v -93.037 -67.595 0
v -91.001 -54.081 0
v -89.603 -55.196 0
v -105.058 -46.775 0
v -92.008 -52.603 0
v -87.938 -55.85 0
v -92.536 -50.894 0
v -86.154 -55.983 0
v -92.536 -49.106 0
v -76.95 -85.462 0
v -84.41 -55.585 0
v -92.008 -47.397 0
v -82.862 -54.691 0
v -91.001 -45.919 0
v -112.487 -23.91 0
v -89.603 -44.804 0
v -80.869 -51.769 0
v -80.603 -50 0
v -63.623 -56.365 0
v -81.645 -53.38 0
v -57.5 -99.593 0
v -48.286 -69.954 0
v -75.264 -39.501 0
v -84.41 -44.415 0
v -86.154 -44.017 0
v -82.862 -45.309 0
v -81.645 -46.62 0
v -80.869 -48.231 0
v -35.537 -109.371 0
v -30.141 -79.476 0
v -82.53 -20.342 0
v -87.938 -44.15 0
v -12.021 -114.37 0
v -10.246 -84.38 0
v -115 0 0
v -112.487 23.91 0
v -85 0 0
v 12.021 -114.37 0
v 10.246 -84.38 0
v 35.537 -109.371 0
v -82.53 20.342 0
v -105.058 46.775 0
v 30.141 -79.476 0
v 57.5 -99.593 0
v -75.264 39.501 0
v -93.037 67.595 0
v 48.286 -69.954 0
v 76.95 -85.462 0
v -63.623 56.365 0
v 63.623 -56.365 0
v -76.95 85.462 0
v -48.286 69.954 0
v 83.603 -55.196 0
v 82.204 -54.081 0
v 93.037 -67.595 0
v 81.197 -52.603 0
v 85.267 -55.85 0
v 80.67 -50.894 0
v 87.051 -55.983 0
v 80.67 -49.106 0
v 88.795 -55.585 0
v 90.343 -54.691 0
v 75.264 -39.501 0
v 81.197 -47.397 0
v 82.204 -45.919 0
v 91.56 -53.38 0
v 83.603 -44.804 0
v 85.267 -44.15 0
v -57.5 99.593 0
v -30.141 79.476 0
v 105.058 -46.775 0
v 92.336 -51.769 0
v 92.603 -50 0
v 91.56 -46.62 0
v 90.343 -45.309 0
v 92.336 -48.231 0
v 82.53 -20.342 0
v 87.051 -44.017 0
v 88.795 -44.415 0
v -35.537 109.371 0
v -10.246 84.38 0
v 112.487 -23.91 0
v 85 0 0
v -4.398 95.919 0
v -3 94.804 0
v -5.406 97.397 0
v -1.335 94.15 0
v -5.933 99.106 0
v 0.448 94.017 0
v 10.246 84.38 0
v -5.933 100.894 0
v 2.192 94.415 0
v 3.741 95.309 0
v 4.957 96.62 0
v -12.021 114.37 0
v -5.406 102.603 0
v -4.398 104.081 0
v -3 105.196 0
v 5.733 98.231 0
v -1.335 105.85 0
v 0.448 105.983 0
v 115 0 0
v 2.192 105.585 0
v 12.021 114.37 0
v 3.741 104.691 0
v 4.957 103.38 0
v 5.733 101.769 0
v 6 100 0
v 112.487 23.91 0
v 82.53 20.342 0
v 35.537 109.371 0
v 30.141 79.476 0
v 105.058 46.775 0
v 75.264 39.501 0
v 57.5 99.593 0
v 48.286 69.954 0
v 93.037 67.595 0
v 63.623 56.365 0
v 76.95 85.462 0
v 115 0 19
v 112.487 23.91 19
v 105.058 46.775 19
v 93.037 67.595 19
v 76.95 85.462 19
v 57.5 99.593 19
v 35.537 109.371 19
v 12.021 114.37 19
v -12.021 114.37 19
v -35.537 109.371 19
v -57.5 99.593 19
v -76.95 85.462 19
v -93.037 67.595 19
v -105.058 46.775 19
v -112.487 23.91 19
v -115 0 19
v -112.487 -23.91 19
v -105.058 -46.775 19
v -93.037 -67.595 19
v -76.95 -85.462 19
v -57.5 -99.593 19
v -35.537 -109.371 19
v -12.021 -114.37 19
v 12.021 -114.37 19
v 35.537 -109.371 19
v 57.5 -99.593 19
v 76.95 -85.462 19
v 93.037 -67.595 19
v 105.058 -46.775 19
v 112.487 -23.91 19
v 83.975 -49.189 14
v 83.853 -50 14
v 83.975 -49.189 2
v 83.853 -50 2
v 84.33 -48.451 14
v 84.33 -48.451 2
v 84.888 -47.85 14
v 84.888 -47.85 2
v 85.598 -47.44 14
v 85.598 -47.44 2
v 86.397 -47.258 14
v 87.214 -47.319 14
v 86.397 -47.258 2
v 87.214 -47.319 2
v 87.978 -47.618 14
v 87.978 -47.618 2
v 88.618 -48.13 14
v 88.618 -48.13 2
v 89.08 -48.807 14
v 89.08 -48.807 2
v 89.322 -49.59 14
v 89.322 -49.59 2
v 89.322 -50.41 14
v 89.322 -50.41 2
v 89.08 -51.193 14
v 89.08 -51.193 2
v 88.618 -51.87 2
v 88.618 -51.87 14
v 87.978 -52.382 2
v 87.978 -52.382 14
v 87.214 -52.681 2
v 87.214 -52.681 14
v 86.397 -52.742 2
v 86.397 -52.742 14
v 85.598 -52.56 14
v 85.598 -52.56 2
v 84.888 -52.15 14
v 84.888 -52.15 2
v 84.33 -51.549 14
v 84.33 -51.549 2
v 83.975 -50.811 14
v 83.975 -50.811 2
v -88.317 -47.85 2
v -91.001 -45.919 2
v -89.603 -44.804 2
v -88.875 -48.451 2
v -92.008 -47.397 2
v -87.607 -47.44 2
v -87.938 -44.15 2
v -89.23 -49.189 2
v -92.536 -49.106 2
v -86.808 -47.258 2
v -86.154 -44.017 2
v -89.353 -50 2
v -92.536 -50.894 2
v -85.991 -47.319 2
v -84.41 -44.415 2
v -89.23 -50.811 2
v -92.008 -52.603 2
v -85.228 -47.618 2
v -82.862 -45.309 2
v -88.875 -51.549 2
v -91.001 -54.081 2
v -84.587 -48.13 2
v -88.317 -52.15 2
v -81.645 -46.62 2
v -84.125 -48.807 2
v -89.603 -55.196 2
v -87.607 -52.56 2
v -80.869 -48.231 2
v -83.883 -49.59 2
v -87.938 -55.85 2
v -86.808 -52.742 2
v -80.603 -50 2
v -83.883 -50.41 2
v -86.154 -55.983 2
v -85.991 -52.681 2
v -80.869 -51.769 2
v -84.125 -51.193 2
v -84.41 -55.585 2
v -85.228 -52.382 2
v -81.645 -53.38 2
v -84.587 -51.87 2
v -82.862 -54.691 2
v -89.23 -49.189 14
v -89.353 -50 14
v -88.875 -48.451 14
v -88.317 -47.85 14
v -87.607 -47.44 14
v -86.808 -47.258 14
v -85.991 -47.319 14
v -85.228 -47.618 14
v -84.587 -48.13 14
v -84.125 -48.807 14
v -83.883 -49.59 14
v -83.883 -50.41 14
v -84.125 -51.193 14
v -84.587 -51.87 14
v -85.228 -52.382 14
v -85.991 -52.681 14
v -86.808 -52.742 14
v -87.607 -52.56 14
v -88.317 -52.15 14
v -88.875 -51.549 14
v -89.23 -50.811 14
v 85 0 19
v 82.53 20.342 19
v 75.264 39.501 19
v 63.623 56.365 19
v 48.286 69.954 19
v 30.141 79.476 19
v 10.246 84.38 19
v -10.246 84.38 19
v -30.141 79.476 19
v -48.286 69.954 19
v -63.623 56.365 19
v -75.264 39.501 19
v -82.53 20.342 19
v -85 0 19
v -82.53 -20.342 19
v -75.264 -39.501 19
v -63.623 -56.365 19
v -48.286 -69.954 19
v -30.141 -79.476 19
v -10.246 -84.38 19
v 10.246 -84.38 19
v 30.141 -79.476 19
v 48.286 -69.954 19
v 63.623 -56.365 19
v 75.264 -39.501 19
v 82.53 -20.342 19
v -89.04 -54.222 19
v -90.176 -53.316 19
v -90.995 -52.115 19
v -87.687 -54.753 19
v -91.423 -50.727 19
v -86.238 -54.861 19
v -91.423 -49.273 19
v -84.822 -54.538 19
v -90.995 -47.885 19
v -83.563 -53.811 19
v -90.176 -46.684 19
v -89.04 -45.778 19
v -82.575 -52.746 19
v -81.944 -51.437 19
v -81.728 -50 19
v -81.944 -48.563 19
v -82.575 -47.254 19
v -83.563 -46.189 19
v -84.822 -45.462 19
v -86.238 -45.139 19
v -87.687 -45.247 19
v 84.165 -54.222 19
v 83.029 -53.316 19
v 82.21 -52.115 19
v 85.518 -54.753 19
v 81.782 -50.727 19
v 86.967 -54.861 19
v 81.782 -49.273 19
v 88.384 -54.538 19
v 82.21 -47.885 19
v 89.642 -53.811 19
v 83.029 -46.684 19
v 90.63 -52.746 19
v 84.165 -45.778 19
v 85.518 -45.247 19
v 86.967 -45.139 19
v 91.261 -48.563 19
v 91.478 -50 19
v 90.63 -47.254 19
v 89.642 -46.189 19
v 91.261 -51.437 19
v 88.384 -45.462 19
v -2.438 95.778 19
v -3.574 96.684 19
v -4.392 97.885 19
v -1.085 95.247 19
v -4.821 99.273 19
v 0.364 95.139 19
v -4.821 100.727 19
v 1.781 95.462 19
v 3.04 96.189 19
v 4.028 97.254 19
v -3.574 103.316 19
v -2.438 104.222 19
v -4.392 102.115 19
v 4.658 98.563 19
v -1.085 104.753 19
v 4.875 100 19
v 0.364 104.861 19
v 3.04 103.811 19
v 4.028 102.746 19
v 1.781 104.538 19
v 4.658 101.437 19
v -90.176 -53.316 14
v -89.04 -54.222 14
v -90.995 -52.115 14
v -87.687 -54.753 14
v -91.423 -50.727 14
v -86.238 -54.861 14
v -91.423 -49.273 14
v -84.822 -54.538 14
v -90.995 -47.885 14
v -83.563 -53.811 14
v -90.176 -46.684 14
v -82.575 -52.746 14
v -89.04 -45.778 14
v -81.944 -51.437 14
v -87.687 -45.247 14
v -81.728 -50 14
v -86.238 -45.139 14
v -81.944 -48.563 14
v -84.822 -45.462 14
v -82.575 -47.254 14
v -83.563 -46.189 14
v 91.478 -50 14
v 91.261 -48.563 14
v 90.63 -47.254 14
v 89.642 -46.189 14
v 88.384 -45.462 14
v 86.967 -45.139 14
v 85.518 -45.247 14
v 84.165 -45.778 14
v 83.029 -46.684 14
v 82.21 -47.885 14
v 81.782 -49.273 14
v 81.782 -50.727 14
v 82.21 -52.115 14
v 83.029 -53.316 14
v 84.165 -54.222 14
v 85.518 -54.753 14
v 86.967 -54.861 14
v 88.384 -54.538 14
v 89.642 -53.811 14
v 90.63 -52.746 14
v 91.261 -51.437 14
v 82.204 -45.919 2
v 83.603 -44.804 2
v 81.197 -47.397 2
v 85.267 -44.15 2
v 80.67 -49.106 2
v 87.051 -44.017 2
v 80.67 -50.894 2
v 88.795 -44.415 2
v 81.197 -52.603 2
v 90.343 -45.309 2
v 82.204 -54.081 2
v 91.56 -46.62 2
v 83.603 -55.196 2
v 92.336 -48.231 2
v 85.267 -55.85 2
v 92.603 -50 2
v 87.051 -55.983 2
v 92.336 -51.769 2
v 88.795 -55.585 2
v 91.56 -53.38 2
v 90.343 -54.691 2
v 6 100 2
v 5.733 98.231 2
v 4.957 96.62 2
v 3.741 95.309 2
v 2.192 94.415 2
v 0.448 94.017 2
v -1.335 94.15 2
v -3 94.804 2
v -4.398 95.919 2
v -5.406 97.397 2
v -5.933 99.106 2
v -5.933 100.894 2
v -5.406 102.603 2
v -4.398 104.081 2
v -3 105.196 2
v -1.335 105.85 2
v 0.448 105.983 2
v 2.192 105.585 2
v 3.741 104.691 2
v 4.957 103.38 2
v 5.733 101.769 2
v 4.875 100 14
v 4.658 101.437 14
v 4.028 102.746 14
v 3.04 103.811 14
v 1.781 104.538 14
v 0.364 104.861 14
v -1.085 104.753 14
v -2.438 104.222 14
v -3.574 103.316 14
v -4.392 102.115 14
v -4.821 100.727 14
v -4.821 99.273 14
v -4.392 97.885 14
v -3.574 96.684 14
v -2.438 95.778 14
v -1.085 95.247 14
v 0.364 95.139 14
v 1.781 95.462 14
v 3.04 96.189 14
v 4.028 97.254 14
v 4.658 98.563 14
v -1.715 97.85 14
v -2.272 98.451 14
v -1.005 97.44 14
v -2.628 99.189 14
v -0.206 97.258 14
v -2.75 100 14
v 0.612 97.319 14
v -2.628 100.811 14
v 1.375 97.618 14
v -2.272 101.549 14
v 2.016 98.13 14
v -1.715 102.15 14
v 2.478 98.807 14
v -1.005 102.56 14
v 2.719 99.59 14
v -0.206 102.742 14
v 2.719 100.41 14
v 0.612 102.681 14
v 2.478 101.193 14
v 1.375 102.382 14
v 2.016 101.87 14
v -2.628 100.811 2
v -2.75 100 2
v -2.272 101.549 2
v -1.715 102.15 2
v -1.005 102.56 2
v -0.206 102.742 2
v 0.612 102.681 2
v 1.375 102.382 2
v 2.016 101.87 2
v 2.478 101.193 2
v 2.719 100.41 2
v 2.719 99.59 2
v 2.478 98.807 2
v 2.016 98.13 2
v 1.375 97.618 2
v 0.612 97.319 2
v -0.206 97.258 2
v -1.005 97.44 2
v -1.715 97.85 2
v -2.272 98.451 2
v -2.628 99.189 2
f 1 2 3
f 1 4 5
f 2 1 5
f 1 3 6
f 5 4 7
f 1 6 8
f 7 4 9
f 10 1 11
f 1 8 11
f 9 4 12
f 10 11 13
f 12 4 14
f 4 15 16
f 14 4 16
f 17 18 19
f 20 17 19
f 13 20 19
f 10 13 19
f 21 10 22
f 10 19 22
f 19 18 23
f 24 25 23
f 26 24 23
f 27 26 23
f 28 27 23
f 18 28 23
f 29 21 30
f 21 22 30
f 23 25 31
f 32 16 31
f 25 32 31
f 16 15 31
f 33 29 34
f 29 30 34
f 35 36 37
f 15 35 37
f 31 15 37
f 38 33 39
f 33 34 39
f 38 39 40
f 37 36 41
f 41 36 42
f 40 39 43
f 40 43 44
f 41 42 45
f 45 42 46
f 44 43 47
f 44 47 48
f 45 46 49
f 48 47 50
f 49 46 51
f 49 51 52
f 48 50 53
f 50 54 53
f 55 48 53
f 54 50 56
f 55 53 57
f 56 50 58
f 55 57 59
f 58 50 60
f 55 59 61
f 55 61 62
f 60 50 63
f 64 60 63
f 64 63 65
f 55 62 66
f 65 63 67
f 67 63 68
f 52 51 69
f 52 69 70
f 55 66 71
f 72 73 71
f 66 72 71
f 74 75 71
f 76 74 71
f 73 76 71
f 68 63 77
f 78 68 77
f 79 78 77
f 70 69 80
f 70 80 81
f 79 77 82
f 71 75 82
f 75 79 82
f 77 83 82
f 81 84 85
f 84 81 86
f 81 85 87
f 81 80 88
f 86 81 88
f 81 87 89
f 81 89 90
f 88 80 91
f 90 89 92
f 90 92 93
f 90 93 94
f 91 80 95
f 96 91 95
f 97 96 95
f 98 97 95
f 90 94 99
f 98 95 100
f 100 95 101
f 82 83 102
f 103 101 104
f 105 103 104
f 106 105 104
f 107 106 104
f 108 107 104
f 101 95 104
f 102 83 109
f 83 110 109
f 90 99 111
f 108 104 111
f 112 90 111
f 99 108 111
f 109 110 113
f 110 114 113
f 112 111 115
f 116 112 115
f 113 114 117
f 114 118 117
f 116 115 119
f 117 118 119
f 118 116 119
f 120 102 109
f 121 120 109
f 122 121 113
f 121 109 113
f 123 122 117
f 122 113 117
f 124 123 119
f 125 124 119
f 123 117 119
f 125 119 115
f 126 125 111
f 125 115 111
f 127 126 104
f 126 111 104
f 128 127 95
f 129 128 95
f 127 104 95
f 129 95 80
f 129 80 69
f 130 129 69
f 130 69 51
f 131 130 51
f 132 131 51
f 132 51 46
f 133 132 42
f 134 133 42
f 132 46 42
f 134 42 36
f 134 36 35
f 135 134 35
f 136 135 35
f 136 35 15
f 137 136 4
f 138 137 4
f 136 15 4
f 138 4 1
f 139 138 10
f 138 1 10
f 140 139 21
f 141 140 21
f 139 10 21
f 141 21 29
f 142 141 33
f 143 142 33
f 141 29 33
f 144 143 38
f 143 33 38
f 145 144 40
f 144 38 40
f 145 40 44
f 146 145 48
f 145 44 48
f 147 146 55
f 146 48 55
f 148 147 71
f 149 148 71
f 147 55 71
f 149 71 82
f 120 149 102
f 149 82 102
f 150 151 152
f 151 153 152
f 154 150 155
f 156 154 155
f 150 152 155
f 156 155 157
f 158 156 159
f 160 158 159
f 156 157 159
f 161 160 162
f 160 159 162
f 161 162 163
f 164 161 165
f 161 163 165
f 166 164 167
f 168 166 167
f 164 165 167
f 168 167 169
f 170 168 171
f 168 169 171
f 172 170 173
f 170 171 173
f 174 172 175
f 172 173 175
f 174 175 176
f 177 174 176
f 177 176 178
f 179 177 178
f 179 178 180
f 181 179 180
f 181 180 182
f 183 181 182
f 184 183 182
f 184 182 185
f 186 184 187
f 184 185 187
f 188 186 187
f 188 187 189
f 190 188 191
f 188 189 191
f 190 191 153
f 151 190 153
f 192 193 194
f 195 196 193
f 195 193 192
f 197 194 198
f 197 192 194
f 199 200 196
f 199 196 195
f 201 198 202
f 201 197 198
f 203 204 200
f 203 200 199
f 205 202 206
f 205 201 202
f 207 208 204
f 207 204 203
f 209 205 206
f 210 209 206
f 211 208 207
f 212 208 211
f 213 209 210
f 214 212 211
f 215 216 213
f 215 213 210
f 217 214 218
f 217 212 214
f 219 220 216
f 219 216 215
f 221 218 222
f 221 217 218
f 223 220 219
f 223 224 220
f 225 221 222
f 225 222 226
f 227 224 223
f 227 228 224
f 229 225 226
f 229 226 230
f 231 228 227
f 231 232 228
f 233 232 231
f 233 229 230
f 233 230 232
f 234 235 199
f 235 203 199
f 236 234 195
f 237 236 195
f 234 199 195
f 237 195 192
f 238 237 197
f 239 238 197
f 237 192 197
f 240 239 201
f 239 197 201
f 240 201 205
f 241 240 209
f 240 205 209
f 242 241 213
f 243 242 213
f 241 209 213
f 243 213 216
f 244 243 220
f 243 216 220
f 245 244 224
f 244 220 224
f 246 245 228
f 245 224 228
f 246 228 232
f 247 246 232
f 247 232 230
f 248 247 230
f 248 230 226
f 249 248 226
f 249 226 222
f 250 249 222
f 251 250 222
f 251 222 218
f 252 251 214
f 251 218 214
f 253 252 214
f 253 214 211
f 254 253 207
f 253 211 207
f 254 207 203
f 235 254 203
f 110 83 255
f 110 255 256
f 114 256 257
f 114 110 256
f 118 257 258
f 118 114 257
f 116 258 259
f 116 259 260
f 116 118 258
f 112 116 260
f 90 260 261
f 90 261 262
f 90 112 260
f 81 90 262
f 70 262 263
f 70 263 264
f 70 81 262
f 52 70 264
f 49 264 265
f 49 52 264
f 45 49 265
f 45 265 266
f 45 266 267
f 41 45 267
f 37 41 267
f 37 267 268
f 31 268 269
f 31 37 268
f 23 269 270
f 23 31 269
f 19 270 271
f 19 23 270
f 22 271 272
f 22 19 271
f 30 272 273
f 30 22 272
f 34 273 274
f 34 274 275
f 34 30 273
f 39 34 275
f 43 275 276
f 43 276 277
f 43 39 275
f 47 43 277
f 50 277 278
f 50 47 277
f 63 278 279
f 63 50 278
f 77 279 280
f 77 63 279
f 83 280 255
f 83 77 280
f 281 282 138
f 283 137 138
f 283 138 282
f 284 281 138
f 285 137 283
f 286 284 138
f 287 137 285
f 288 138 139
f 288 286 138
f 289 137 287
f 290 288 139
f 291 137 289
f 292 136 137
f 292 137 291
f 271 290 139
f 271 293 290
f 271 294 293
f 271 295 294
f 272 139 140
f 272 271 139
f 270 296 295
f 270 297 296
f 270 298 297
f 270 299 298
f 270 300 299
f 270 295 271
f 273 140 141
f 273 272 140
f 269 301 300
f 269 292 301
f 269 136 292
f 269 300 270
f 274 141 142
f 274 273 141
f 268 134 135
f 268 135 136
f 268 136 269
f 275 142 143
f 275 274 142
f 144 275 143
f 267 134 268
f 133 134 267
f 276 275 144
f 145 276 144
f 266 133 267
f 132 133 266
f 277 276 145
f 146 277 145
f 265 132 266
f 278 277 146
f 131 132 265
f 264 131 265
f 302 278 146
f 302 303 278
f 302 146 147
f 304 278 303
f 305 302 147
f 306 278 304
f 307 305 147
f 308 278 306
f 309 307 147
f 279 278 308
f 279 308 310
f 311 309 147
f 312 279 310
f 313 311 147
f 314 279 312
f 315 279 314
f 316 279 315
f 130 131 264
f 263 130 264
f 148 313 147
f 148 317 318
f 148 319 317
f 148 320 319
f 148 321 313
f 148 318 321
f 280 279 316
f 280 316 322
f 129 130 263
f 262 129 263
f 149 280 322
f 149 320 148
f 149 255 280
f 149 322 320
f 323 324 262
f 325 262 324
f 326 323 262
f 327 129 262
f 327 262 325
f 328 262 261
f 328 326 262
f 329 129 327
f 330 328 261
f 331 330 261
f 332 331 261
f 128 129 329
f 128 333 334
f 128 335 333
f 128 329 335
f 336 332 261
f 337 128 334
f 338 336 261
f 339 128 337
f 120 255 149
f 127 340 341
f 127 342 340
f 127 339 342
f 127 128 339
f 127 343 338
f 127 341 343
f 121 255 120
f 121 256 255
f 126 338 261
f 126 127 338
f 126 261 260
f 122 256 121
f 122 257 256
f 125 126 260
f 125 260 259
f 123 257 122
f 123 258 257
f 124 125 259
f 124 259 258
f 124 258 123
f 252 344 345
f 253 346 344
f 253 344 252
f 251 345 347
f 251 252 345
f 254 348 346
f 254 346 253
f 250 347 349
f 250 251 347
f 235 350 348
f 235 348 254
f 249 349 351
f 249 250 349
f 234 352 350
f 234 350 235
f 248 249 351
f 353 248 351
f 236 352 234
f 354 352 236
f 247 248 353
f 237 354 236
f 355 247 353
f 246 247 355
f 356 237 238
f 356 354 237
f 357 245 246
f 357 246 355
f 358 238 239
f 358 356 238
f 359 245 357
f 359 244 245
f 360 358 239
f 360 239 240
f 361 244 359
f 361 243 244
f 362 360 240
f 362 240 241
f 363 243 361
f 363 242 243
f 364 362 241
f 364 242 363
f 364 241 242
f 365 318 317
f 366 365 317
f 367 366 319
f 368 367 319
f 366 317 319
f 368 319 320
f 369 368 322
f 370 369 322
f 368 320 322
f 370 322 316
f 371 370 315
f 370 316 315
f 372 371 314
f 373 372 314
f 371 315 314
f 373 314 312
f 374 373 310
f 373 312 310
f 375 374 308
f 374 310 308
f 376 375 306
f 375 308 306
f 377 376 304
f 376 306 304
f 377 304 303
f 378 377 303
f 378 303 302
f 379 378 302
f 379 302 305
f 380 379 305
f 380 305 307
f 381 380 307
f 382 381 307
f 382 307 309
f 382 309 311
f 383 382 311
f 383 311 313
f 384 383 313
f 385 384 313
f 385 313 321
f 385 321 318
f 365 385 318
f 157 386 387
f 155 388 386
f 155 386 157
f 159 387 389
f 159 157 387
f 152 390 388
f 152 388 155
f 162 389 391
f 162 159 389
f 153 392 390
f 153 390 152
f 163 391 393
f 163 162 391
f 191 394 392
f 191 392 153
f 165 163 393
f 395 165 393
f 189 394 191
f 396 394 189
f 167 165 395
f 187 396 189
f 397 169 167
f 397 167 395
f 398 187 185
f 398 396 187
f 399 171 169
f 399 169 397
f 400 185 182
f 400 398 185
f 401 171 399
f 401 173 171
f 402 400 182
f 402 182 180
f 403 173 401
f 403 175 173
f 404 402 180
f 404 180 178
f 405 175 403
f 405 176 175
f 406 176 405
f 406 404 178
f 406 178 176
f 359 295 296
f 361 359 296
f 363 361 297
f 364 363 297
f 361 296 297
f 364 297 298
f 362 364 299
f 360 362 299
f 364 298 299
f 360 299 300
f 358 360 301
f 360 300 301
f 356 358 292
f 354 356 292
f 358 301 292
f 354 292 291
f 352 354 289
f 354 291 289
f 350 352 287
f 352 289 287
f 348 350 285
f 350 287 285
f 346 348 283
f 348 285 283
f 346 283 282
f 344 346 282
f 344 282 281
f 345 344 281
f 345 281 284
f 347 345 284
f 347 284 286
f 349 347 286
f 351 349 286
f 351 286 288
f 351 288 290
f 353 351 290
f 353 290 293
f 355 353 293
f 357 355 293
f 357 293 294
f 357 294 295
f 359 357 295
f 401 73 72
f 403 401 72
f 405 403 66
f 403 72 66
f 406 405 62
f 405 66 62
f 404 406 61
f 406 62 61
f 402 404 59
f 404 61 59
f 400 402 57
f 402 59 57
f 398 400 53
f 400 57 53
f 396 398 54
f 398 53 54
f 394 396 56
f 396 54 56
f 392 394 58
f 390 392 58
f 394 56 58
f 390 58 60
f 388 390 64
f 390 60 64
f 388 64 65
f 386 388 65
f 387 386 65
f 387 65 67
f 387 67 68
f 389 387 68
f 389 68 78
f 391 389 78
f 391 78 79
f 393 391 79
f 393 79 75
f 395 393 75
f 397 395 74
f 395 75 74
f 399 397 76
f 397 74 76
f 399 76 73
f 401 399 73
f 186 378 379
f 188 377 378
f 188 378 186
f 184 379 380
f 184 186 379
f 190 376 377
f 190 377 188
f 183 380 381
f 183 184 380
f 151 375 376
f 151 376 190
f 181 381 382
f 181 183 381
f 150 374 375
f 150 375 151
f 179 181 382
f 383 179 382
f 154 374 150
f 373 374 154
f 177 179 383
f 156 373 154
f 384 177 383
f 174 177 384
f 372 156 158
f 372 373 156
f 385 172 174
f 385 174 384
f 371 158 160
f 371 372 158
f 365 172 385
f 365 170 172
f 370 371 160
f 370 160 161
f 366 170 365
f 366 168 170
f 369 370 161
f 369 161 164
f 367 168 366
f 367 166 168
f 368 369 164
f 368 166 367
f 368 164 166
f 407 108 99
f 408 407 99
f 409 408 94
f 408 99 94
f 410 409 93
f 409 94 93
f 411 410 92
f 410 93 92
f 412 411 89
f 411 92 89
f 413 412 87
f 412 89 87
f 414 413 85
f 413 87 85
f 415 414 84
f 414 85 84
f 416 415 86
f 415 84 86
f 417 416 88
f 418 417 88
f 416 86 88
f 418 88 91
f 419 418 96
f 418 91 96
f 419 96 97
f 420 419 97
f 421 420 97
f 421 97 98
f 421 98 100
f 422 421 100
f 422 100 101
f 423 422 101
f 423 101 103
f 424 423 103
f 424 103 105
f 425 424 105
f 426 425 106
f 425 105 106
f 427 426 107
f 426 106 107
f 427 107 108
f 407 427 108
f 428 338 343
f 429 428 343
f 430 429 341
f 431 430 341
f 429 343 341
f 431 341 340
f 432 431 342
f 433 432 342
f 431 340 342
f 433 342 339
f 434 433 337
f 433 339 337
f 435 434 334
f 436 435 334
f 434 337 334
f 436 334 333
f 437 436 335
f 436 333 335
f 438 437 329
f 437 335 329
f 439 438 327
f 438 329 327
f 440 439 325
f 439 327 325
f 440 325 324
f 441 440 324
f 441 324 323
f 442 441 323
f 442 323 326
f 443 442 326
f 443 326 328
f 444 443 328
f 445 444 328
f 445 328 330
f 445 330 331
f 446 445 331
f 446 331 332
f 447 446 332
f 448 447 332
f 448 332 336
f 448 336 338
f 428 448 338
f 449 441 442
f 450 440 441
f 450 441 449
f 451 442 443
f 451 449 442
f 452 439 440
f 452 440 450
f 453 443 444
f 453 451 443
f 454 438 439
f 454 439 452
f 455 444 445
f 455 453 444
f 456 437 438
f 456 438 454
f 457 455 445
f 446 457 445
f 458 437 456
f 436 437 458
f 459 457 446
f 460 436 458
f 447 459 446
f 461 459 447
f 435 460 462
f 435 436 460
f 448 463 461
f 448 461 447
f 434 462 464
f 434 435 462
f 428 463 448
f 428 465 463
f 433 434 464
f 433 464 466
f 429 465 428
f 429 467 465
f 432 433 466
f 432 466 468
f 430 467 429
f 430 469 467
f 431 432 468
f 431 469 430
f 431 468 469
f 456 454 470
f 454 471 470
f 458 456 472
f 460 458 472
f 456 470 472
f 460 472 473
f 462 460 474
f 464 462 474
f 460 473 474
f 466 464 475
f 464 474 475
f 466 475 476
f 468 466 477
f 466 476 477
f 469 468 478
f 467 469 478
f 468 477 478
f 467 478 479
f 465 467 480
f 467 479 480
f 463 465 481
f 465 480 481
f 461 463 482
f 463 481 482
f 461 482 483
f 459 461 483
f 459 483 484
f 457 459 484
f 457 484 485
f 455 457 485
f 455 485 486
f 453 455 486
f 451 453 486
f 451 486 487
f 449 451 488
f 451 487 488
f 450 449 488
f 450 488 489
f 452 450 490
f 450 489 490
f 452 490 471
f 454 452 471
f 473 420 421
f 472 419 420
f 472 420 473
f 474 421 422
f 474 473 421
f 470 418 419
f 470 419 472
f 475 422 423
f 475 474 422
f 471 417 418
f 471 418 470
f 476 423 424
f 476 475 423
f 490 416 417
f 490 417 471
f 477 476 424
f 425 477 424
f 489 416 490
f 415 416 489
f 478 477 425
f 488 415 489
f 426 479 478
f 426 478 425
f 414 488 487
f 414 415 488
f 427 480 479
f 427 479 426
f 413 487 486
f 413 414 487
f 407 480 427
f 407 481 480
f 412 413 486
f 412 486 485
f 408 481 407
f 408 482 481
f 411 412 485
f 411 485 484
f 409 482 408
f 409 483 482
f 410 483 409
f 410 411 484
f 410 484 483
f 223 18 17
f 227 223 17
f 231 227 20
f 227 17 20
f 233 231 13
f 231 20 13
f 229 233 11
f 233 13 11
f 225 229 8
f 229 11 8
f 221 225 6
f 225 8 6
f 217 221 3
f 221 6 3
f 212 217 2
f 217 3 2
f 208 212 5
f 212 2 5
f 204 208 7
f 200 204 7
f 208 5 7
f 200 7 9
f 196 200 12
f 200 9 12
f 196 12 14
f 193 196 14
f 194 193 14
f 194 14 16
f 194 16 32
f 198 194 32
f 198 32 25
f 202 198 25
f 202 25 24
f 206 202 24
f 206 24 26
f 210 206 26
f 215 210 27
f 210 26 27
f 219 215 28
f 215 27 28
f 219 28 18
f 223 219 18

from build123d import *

# Parameters (mm, degrees)
F0_R           = 115
F0_R_2         = 85
F1_DEPTH       = 19
F2_R           = 6
F3_DEPTH       = 2
F5_D           = 5.5
F5_CBORE_D     = 9.75
F5_CBORE_DEPTH = 5


with BuildPart() as f1:
    # F0 (on Top) → F1 (new body)
    with BuildSketch(Plane.XY):
        Circle(F0_R)
        Circle(F0_R_2, mode=Mode.SUBTRACT)
    extrude(amount=F1_DEPTH)

    # F2 (on face) → F3 (cut)
    with BuildSketch(Plane(origin=(0, 0, 0), x_dir=(1, 0, 0), z_dir=(0, 0, -1))):
        with Locations((0, -100)):
            Circle(F2_R)
        with Locations((86.6025403784, 50)):
            Circle(F2_R)
        with Locations((-86.6025403784, 50)):
            Circle(F2_R)
    extrude(amount=-F3_DEPTH, mode=Mode.SUBTRACT)

    # F5 (through all)
    with Locations(Plane.XY.offset(19)):
        with Locations((0, 100), (86.6025403784, -50), (-86.6025403784, -50)):
            CounterBoreHole(F5_D / 2, F5_CBORE_D / 2, F5_CBORE_DEPTH)


solid = f1.part
